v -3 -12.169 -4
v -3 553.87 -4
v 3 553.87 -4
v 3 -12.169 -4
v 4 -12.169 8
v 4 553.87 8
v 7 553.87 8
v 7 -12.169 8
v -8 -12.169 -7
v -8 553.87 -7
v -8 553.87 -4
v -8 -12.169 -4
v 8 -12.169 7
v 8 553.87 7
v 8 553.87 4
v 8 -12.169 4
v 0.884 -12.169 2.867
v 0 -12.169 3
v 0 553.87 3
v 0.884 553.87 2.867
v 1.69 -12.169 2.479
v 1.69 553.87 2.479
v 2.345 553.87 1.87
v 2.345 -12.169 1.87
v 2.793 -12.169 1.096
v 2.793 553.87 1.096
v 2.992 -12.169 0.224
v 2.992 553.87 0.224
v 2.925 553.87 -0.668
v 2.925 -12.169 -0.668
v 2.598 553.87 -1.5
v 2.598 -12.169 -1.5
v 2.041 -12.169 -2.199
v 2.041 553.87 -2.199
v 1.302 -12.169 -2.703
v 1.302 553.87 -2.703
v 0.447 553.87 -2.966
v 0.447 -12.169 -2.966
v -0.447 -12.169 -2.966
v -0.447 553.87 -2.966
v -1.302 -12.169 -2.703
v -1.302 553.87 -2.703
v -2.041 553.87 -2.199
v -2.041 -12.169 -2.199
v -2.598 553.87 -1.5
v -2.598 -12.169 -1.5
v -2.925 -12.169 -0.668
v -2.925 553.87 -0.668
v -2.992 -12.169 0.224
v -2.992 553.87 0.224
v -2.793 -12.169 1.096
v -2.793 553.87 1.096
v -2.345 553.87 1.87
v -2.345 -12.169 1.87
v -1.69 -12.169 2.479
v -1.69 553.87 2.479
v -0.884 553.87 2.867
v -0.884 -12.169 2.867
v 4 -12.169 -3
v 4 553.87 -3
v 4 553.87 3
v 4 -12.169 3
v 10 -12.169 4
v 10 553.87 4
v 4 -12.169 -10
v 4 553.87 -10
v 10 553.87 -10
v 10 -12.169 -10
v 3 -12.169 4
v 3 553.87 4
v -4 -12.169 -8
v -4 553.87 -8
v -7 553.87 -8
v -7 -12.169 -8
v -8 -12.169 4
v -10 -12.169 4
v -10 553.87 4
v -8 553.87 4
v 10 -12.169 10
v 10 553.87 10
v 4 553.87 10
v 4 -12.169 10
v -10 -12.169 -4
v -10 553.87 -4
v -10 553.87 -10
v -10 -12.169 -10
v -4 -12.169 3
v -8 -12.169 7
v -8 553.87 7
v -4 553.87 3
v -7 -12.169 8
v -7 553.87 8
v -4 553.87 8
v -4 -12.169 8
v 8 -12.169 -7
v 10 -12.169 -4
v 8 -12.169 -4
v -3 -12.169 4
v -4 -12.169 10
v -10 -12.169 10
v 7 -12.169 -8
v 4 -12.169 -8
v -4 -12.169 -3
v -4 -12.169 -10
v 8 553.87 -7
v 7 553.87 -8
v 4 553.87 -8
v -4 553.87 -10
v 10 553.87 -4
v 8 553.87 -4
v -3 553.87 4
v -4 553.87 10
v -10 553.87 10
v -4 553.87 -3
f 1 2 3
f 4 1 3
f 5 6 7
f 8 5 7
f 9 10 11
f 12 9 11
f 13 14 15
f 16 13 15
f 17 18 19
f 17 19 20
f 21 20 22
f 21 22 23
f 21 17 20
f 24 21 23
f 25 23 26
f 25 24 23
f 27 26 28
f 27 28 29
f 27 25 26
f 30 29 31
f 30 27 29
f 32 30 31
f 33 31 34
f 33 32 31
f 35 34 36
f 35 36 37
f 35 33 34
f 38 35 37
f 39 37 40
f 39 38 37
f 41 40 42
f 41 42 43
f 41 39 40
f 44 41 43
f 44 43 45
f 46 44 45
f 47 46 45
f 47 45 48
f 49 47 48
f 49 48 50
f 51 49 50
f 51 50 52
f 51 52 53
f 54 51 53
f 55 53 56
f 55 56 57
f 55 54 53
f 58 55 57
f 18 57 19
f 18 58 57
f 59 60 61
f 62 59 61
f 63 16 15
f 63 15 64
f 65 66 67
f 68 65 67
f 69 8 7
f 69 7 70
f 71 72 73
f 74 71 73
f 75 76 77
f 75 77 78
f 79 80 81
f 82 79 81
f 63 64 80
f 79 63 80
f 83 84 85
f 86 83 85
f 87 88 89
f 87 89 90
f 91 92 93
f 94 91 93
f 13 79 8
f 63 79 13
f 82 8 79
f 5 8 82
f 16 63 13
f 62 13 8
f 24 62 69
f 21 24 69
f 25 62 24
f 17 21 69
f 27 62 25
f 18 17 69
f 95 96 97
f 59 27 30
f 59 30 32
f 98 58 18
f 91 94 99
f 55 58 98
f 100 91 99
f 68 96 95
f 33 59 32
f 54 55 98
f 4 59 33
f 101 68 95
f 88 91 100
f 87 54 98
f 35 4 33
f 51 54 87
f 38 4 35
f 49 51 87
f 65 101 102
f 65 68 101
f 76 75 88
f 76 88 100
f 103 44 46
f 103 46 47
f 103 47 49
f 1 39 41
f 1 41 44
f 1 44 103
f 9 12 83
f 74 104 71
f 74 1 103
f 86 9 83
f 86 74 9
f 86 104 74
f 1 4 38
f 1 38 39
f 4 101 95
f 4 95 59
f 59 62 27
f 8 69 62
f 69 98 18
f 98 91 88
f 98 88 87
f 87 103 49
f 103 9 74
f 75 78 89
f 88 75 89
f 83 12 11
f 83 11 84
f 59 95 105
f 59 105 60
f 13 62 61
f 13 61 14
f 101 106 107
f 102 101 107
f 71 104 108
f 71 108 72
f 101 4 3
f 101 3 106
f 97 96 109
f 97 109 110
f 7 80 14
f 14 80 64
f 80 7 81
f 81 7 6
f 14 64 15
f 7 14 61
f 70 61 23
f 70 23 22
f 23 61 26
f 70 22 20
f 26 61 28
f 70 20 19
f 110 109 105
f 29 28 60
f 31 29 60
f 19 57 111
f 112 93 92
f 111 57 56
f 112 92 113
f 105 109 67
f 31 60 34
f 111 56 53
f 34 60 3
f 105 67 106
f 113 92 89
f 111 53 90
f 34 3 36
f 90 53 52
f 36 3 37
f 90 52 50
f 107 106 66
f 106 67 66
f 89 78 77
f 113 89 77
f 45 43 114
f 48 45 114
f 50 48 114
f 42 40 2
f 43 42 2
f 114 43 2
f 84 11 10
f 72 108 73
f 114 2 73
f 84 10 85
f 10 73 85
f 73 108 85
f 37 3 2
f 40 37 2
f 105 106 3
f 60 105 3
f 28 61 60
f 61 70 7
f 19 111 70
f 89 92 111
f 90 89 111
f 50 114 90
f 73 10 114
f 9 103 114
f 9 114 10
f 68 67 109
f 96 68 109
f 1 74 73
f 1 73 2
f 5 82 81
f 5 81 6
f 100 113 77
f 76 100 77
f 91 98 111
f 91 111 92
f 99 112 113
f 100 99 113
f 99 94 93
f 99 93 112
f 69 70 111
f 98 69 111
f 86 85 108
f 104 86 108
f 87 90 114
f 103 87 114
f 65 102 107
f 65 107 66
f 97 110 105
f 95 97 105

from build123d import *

# Parameters (mm, degrees)
BOSS_EXTRUDE1_START = -12.168666
F_2020_SKETCH_R     = 3
BOSS_EXTRUDE1_DEPTH = 566.038868


with BuildPart() as part:
    # 2020 sketch → Boss-Extrude1 (new body)
    with BuildSketch(Plane(origin=(0, 0, 0), x_dir=(1, 0, 0), z_dir=(0, 1, 0)).offset(BOSS_EXTRUDE1_START)):
        Polygon((-4, 10), (-4, 8), (-7, 8), (-3, 4), (3, 4), (7, 8), (4, 8), (4, 10), (10, 10), (10, 4), (8, 4), (8, 7), (4, 3), (4, -3), (8, -7), (8, -4), (10, -4), (10, -10), (4, -10), (4, -8), (7, -8), (3, -4), (-3, -4), (-7, -8), (-4, -8), (-4, -10), (-10, -10), (-10, -4), (-8, -4), (-8, -7), (-4, -3), (-4, 3), (-8, 7), (-8, 4), (-10, 4), (-10, 10), align=None)
        with Locations(Location((0, 0, 0), (0, 0, 270))):
            Circle(F_2020_SKETCH_R, mode=Mode.SUBTRACT)
    extrude(amount=BOSS_EXTRUDE1_DEPTH)


solid = part.part
